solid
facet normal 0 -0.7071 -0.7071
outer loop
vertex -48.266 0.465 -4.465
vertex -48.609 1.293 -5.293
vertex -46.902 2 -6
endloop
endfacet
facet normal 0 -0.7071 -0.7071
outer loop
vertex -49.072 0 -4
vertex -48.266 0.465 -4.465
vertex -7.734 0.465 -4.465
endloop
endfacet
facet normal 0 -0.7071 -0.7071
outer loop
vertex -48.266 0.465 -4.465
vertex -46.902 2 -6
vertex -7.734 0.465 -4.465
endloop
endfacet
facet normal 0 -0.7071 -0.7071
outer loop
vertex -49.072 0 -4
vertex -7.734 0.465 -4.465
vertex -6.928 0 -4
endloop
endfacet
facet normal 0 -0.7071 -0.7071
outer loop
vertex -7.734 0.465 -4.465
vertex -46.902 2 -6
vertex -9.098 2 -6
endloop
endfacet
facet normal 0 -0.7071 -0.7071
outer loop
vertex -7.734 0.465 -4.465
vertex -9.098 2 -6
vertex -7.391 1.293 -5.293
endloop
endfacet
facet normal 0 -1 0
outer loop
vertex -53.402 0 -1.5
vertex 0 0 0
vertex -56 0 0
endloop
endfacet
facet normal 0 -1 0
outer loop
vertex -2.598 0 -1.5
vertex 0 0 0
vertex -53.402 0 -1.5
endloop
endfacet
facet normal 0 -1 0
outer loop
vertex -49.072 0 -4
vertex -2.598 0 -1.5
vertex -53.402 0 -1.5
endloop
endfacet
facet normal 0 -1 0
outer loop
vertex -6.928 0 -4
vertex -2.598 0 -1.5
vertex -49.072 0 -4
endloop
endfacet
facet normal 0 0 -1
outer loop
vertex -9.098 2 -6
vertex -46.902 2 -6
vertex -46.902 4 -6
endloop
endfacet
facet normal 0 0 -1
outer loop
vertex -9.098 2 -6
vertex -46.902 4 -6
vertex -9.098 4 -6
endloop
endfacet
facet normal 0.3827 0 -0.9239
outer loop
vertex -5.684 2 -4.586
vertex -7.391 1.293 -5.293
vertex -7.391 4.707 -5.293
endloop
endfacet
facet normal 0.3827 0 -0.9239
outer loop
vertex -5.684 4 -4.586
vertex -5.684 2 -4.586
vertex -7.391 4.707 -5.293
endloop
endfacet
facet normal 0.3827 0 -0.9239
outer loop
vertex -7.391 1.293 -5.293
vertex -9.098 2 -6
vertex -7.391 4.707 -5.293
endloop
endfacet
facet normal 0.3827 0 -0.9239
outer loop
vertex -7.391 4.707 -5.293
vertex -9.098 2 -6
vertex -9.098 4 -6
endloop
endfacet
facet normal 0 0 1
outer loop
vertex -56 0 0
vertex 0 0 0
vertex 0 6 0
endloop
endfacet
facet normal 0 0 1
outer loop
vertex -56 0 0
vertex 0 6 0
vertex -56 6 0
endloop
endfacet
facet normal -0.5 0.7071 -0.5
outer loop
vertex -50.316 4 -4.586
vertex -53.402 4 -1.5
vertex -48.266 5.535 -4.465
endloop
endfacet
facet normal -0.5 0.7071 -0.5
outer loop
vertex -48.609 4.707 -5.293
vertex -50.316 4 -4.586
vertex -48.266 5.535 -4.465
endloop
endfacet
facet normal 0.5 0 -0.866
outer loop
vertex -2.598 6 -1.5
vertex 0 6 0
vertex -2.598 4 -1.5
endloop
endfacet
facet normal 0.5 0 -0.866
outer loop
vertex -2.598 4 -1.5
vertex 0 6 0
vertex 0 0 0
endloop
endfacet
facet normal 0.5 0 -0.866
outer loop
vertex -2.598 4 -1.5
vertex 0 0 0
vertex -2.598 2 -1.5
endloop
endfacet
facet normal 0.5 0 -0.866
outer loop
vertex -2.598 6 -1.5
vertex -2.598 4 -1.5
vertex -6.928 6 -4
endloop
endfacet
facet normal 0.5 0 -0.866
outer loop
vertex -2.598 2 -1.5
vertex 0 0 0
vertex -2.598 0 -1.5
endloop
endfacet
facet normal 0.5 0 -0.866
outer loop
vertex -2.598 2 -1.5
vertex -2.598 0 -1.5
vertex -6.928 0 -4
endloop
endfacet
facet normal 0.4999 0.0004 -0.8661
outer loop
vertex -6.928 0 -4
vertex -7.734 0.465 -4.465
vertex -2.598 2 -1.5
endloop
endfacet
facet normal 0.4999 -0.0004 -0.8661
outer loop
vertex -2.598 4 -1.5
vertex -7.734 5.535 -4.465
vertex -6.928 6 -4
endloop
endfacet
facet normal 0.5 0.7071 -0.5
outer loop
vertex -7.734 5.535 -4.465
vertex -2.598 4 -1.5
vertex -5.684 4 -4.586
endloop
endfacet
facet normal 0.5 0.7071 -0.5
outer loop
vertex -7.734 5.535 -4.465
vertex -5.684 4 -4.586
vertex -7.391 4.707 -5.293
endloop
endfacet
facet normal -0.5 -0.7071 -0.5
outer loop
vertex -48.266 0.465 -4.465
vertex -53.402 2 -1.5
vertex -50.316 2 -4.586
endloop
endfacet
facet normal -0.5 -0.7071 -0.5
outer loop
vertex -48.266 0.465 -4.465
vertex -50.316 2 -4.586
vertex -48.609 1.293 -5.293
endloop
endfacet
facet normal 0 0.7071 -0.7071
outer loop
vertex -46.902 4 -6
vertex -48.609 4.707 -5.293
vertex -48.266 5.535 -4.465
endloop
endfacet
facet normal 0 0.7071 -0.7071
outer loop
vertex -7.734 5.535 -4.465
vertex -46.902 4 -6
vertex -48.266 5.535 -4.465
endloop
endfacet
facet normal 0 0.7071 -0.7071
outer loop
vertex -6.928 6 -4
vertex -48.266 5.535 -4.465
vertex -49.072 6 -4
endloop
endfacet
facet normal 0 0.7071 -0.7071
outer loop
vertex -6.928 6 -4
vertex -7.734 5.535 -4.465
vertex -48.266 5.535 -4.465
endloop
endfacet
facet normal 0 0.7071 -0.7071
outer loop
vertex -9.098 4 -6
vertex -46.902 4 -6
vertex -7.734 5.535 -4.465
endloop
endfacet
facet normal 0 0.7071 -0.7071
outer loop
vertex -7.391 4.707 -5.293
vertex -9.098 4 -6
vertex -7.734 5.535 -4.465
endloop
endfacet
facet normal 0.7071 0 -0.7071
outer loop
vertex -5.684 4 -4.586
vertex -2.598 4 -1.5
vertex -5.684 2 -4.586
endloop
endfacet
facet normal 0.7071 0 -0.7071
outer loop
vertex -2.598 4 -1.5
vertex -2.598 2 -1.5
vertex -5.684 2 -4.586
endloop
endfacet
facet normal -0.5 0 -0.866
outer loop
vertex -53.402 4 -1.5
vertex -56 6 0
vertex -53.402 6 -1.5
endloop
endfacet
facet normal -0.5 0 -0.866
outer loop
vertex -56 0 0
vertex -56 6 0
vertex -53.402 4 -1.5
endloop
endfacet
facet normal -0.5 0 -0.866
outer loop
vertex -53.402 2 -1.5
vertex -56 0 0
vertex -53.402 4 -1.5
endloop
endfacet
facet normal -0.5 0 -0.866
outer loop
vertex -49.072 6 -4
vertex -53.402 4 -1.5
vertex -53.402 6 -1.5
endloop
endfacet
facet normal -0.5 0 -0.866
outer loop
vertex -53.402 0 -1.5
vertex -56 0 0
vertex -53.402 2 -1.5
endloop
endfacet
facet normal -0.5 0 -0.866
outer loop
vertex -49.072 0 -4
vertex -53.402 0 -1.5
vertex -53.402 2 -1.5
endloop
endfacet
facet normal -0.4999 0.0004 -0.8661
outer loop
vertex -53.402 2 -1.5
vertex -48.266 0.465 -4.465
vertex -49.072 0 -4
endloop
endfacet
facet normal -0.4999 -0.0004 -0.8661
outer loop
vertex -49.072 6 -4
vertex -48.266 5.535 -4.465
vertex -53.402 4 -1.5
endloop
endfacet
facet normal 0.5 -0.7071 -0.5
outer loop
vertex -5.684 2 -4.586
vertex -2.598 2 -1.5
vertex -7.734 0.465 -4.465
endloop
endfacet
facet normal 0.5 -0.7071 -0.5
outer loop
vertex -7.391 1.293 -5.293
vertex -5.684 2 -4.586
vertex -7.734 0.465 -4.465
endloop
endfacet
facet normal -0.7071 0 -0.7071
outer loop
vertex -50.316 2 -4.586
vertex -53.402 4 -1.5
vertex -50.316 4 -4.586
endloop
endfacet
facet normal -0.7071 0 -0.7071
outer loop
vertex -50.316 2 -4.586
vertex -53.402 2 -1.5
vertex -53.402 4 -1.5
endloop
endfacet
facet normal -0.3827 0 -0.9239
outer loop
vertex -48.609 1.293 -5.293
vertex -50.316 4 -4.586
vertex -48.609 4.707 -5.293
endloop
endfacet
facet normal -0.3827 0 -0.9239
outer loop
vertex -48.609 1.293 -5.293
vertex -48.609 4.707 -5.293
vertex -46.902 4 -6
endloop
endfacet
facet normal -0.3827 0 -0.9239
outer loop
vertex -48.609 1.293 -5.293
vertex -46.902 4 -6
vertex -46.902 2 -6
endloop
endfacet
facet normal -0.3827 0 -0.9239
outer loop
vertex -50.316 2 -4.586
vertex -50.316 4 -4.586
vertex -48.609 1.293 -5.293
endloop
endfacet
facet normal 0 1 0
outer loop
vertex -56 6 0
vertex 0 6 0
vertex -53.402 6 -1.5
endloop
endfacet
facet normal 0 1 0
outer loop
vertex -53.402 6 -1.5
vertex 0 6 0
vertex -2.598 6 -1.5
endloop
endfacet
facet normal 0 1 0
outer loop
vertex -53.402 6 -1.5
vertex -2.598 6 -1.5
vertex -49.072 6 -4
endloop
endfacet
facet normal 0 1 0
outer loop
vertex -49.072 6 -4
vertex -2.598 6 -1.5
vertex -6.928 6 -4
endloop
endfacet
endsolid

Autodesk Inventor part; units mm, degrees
ref_plane "YZ Plane" through (0, 0, 0) normal (1, 0, 0) x (0, 1, 0)
ref_plane "XZ Plane" through (0, 0, 0) normal (0, 1, 0) x (-1, 0, 0)
ref_plane "XY Plane" through (0, 0, 0) normal (0, 0, 1) x (1, 0, 0)
sketch "Sketch1" plane through (0, 0, 0) normal (0, 1, 0) x (-1, 0, 0)
  line L0 (0, 0) -> (56, 0)
  line L1 (56, 0) -> (54.5, 0)
  line L2 (56, 0) -> (21.359, -20)
  line L3 (56, 0) -> (96, 0) construction
  line L4 (28, 0) -> (28, 5.9969)
  line L5 (0, 0) -> (34.641, -20)
  line L6 (28, 0) -> (28, -6)
  line L7 (28, -6) -> (78, -6)
  line L8 (28, -6) -> (-22, -6)
  line L9 (56, 0) -> (53.4019, -1.5)
  line L10 (53.4019, -1.5) -> (39.2598, -15.6421)
  line L11 (53.4019, -1.5) -> (73.4019, -1.5) construction
  line L12 (2.5981, -1.5) -> (16.7402, -15.6421)
  point P0 (48.9019, -6)
  point P1 (7.0981, -6)
  dimension "d0" = 56
  dimension "d3" = 40
  dimension "d4" = 150
  dimension "d5" = 6
  dimension "d6" = 50
  dimension "d7" = 50
  dimension "d8" = 3
  dimension "d9" = 20
  dimension "d10" = 135
extrude "Extrusion1" add sketch "Sketch1" along normal blind 6 contours L0 L6 L8 L5 | L0 L2 L7 L6 | L5 L8 L12 | L2 L10 L7
chamfer "Chamfer1" distance 2 angle 45 6 edges at (-48.9019, 3, -6) (-51.1519, 6, -3.75) (-51.1519, 0, -3.75) (-4.8481, 0, -3.75) (-7.0981, 3, -6) (-4.8481, 6, -3.75)
chamfer "Chamfer2" distance 2 angle 45 2 edges at (-37.0367, 0, -6) (-37.0367, 6, -6)
properties part number "parallel_bar_long_no_hole_v2"
